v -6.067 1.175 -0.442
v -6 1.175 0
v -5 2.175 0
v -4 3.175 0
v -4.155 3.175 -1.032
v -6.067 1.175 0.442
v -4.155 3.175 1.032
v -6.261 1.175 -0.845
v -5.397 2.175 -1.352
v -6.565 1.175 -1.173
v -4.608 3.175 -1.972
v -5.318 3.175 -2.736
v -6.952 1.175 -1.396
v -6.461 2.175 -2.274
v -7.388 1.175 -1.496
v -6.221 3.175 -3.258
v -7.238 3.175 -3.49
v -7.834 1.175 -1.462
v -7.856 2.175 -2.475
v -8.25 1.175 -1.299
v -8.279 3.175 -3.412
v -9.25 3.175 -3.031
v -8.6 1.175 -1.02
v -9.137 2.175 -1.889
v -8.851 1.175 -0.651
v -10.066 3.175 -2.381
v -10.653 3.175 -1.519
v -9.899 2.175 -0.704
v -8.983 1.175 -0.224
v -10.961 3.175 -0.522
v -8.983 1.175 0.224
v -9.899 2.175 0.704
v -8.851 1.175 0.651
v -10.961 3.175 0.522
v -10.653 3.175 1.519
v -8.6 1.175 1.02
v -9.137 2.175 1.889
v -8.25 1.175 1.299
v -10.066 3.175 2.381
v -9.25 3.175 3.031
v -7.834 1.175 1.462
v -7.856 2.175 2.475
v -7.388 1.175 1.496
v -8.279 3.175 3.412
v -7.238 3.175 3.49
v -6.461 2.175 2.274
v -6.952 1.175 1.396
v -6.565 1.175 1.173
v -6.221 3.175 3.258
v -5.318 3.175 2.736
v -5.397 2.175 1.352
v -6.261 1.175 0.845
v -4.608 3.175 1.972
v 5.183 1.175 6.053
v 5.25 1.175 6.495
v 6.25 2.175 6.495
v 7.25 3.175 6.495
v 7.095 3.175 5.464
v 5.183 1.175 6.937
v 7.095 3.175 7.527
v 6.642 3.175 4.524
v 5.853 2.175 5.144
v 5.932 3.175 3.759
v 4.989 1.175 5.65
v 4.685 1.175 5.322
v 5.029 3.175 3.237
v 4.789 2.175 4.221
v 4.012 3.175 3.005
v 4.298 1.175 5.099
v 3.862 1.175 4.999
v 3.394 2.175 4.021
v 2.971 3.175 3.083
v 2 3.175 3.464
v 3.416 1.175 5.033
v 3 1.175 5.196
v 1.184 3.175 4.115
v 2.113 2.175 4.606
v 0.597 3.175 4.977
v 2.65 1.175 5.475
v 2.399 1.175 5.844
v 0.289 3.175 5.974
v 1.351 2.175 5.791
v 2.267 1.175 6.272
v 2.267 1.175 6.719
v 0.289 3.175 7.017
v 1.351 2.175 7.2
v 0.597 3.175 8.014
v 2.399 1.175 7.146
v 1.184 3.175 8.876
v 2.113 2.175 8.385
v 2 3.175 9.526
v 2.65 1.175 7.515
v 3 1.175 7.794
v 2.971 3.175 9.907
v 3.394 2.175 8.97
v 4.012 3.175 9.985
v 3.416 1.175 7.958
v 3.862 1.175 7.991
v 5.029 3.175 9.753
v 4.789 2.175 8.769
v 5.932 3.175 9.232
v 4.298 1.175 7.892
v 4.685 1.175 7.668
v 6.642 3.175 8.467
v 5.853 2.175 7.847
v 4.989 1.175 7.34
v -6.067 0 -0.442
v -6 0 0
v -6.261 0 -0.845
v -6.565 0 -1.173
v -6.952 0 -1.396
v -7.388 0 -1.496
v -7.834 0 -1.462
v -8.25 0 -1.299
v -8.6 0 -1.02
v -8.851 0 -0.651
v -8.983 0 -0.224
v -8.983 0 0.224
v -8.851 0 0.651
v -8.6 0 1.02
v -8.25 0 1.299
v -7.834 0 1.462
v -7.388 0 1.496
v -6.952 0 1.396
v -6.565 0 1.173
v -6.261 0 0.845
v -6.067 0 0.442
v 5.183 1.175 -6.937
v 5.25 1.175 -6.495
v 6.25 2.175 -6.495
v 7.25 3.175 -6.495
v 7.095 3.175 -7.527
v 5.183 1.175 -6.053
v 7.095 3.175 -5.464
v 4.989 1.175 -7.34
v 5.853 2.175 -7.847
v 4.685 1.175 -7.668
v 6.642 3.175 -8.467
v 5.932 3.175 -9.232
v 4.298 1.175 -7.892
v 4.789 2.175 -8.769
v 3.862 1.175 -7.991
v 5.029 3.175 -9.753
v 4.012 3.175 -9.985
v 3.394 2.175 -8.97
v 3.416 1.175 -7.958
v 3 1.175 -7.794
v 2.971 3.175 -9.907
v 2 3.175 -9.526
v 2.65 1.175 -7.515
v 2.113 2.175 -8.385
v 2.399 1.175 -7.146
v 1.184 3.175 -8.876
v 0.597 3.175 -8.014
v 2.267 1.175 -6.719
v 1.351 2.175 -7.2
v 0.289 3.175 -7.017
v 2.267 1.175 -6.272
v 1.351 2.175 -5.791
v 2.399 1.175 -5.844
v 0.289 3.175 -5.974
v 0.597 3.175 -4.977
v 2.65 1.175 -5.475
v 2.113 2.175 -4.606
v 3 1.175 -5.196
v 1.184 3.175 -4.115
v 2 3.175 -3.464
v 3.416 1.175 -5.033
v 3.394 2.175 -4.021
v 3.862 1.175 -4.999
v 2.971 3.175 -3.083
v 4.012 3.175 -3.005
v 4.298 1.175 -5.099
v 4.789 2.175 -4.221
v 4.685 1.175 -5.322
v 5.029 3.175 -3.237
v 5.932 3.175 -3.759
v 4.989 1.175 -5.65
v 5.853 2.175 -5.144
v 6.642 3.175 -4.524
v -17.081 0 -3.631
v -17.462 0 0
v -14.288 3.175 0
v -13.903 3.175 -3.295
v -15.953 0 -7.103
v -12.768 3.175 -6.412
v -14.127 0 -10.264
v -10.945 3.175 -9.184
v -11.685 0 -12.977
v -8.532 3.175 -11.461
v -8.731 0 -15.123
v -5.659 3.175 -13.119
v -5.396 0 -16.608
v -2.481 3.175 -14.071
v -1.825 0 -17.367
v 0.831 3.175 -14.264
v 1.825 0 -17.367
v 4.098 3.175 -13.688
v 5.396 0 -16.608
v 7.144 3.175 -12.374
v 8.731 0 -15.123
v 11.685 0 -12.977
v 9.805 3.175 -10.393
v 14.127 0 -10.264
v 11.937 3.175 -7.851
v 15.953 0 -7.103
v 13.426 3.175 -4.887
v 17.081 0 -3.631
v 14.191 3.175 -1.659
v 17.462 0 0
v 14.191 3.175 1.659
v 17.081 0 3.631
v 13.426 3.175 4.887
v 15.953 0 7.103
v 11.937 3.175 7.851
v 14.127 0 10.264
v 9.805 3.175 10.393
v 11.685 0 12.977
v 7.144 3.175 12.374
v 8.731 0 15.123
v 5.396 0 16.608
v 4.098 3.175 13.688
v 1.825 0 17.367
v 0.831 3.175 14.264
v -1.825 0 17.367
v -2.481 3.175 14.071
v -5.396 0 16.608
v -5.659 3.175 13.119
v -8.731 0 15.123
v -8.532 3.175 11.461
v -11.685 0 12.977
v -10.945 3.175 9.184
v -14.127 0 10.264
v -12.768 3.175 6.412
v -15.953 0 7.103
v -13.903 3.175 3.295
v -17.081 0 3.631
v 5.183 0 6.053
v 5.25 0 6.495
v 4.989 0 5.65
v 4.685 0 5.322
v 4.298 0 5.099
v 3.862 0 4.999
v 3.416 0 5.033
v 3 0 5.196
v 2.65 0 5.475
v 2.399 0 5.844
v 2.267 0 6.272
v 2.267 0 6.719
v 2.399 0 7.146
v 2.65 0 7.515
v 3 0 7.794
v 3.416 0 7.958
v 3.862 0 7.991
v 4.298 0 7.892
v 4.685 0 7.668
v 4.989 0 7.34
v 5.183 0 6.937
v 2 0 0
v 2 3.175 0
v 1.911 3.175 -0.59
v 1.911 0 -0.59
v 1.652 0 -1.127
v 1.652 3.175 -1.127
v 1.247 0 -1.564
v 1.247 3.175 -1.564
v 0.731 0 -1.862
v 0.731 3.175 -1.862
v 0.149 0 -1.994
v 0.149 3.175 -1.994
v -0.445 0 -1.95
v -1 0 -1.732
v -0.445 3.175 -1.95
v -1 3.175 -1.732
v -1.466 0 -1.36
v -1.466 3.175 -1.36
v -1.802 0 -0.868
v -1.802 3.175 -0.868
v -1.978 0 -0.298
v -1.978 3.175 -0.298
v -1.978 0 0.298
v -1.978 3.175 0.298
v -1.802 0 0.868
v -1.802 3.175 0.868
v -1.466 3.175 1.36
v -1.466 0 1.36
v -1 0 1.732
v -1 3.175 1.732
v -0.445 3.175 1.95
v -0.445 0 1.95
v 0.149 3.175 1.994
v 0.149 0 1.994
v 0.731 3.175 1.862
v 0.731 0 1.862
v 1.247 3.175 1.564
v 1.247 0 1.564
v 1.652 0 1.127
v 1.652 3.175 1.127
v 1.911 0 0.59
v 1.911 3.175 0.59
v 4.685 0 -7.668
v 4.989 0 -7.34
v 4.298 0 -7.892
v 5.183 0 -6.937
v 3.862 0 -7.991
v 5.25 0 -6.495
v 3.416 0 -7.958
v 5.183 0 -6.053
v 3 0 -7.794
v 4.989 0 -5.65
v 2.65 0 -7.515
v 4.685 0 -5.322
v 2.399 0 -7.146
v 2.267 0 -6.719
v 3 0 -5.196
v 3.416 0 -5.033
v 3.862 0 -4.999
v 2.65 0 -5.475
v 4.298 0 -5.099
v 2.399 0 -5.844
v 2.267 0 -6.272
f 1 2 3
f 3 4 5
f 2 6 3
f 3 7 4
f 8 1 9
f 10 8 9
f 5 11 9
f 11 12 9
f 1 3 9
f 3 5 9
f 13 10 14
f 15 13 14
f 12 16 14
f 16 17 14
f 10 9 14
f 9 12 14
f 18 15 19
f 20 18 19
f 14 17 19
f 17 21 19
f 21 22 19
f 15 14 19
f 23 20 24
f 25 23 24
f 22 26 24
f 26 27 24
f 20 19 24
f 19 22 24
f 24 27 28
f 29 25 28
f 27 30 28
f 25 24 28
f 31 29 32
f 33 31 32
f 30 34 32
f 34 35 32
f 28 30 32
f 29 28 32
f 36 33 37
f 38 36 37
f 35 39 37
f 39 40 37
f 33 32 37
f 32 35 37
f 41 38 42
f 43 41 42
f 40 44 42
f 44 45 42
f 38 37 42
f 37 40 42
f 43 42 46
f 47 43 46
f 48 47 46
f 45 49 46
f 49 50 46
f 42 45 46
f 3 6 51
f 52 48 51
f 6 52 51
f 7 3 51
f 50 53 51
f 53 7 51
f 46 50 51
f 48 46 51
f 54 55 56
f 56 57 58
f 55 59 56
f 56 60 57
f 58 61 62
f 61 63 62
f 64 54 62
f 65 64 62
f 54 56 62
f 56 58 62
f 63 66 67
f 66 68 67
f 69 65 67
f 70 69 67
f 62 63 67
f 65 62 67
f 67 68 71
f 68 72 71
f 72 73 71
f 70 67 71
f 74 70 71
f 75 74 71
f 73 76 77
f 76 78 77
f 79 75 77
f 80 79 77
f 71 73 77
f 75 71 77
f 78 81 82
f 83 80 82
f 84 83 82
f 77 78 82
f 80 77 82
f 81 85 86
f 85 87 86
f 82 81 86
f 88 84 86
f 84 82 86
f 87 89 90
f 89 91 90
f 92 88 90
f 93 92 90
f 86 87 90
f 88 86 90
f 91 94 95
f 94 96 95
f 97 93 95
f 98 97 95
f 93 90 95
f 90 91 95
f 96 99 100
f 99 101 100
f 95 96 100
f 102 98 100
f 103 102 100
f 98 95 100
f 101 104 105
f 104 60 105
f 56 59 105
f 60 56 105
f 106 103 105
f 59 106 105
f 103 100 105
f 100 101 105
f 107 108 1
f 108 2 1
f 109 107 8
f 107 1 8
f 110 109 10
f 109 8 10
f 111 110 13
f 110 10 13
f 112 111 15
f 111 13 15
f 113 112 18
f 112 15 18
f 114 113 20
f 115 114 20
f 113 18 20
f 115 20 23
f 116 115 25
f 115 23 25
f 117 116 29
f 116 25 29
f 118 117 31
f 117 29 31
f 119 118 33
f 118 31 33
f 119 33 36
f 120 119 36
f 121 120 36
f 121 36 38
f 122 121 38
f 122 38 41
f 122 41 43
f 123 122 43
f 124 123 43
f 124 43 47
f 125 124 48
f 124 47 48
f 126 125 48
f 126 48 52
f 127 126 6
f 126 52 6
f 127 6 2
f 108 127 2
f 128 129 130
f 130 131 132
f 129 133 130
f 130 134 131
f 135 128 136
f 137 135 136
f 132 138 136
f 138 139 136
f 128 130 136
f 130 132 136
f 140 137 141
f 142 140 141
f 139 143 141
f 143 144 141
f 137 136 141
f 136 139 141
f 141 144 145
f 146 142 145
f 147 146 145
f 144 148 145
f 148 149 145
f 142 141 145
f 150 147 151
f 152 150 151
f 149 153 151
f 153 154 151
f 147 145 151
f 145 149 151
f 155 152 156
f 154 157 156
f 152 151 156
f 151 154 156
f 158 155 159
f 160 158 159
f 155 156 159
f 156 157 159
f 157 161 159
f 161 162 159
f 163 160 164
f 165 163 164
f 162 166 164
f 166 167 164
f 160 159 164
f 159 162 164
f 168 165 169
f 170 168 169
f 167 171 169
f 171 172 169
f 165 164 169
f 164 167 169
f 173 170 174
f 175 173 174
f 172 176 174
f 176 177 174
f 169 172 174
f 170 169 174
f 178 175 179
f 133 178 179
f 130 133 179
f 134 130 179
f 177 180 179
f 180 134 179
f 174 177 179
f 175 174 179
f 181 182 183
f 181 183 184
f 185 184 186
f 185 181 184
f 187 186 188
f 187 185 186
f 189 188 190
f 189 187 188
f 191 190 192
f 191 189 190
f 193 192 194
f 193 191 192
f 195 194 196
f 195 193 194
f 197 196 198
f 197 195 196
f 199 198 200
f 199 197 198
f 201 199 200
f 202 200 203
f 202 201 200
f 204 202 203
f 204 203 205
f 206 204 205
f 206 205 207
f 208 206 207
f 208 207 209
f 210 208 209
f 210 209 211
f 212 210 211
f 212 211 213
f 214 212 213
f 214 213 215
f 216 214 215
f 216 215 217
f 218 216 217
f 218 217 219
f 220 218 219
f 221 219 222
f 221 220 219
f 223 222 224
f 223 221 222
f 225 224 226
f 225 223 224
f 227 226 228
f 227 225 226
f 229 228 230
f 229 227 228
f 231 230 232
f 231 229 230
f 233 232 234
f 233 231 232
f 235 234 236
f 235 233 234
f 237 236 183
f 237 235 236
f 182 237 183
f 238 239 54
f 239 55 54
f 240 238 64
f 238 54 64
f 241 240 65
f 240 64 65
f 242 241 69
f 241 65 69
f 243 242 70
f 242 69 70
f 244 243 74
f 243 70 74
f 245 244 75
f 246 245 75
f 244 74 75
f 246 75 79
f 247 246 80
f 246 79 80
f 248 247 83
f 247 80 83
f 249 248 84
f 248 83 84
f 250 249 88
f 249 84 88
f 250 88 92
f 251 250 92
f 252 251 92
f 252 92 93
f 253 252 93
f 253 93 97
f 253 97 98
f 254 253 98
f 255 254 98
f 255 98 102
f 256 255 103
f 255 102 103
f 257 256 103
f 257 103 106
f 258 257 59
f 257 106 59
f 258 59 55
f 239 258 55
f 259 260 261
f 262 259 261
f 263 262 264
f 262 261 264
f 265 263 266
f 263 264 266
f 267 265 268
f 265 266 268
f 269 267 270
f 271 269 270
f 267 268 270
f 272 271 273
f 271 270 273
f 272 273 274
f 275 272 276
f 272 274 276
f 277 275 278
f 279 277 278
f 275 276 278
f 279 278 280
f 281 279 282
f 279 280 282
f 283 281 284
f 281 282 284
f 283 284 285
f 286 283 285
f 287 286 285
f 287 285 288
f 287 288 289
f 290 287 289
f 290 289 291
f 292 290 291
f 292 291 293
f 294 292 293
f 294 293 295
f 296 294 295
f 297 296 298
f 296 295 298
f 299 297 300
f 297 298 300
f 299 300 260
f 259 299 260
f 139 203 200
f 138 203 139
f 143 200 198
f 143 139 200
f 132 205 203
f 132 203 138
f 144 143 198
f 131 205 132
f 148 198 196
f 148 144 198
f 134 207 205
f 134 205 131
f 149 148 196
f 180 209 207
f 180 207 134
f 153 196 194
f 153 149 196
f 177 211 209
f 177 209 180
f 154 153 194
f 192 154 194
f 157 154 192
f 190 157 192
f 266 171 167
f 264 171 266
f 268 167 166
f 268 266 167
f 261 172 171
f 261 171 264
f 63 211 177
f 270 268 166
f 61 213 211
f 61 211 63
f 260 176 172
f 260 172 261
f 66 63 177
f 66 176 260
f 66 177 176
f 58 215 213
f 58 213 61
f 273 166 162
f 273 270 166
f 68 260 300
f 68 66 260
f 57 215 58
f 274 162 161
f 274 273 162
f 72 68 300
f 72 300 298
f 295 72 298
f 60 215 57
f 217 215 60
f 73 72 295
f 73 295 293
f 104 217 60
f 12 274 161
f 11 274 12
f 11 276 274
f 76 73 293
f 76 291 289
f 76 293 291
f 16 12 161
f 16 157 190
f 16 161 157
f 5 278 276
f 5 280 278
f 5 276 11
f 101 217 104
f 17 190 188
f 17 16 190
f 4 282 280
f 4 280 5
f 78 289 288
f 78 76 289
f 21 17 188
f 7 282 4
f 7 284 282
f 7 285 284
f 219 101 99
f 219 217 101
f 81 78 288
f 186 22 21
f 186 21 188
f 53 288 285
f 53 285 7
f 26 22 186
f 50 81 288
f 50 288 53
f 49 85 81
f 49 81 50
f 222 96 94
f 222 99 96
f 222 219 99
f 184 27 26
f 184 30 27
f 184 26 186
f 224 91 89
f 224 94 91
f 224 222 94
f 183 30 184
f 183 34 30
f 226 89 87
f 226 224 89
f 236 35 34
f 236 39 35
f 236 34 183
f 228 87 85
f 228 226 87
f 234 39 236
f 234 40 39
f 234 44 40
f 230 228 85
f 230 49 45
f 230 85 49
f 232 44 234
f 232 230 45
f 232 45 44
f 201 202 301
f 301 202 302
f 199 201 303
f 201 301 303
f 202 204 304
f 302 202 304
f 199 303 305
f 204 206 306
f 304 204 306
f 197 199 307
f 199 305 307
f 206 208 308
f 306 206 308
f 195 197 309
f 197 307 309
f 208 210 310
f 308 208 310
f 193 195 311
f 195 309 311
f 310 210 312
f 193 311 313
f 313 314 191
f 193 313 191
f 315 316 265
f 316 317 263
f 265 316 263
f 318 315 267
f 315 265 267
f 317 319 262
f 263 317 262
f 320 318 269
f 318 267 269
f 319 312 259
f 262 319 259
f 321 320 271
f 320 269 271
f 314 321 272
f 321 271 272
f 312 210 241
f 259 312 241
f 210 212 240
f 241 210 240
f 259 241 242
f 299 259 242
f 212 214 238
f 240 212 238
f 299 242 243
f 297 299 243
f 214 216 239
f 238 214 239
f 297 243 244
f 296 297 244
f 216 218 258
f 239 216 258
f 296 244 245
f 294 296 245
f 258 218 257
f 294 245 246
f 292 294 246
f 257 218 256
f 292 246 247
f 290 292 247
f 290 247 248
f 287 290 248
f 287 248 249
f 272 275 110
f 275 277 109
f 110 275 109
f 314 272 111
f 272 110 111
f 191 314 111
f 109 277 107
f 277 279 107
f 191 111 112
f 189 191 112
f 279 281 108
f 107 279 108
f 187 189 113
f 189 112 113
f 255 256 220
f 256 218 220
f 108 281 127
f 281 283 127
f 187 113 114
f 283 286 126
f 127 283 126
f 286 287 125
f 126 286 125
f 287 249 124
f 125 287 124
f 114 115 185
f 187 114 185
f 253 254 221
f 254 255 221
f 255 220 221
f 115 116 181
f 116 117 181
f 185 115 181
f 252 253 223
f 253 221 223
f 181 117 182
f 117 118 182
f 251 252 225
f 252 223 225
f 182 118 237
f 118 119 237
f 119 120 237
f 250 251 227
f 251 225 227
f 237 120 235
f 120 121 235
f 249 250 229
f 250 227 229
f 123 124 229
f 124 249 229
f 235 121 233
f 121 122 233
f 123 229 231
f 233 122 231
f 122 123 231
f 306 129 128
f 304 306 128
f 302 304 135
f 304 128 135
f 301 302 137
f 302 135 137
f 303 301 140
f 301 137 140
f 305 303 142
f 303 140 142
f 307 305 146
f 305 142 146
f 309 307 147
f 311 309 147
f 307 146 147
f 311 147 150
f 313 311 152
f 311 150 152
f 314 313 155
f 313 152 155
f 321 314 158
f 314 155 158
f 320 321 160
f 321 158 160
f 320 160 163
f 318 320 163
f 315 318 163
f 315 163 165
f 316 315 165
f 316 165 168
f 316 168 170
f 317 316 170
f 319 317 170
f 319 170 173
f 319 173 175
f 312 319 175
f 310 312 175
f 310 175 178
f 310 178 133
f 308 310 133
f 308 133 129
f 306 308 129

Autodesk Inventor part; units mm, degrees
ref_plane "YZ Plane" through (0, 0, 0) normal (1, 0, 0) x (0, 1, 0)
ref_plane "XZ Plane" through (0, 0, 0) normal (0, 1, 0) x (-1, 0, 0)
ref_plane "XY Plane" through (0, 0, 0) normal (0, 0, 1) x (1, 0, 0)
sketch "Sketch1" plane through (0, 0, 0) normal (0, 1, 0) x (-1, 0, 0)
  circle A0 centre (0, 0) radius 17.4625
  line L0 (0, 0) -> (17.4625, 0) construction
  dimension "d0" = 34.925
extrude "Extrusion1" add sketch "Sketch1" along normal blind 3.175
sketch "Sketch2" plane through (0, 3.175, 0) normal (0, 1, 0) x (1, 0, 0)
  circle A0 centre (0, 0) radius 2
  line L0 (0, 0) -> (-14.2875, 0) construction
  arc A1 (-12.8229, 3.4359) -> (-12.8229, -3.4359) centre (-9.525, 0) ccw projected
  circle A2 centre (0, 0) radius 7.5 construction
  circle A3 centre (-7.5, 0) radius 1.5
  circle A4 centre (3.75, -6.4952) radius 1.5
  circle A5 centre (3.75, 6.4952) radius 1.5
  dimension "d10" = 15
  dimension "d9" = 4
  dimension "d11" = 3
  dimension "d14" = 360
extrude "Extrusion2" cut sketch "Sketch2" against normal through all
chamfer "Chamfer1" distance 2 angle 45 3 edges at (-9, 3.175, 0) (2.25, 3.175, -6.4952) (2.25, 3.175, 6.4952)
chamfer "Chamfer2" distance 3.175 distance2 3.175 1 edges at (17.4625, 3.175, 0) measured on face at (10.0674, 3.175, 0)
properties part number "Hub Cap" material "Aluminum 6061"
